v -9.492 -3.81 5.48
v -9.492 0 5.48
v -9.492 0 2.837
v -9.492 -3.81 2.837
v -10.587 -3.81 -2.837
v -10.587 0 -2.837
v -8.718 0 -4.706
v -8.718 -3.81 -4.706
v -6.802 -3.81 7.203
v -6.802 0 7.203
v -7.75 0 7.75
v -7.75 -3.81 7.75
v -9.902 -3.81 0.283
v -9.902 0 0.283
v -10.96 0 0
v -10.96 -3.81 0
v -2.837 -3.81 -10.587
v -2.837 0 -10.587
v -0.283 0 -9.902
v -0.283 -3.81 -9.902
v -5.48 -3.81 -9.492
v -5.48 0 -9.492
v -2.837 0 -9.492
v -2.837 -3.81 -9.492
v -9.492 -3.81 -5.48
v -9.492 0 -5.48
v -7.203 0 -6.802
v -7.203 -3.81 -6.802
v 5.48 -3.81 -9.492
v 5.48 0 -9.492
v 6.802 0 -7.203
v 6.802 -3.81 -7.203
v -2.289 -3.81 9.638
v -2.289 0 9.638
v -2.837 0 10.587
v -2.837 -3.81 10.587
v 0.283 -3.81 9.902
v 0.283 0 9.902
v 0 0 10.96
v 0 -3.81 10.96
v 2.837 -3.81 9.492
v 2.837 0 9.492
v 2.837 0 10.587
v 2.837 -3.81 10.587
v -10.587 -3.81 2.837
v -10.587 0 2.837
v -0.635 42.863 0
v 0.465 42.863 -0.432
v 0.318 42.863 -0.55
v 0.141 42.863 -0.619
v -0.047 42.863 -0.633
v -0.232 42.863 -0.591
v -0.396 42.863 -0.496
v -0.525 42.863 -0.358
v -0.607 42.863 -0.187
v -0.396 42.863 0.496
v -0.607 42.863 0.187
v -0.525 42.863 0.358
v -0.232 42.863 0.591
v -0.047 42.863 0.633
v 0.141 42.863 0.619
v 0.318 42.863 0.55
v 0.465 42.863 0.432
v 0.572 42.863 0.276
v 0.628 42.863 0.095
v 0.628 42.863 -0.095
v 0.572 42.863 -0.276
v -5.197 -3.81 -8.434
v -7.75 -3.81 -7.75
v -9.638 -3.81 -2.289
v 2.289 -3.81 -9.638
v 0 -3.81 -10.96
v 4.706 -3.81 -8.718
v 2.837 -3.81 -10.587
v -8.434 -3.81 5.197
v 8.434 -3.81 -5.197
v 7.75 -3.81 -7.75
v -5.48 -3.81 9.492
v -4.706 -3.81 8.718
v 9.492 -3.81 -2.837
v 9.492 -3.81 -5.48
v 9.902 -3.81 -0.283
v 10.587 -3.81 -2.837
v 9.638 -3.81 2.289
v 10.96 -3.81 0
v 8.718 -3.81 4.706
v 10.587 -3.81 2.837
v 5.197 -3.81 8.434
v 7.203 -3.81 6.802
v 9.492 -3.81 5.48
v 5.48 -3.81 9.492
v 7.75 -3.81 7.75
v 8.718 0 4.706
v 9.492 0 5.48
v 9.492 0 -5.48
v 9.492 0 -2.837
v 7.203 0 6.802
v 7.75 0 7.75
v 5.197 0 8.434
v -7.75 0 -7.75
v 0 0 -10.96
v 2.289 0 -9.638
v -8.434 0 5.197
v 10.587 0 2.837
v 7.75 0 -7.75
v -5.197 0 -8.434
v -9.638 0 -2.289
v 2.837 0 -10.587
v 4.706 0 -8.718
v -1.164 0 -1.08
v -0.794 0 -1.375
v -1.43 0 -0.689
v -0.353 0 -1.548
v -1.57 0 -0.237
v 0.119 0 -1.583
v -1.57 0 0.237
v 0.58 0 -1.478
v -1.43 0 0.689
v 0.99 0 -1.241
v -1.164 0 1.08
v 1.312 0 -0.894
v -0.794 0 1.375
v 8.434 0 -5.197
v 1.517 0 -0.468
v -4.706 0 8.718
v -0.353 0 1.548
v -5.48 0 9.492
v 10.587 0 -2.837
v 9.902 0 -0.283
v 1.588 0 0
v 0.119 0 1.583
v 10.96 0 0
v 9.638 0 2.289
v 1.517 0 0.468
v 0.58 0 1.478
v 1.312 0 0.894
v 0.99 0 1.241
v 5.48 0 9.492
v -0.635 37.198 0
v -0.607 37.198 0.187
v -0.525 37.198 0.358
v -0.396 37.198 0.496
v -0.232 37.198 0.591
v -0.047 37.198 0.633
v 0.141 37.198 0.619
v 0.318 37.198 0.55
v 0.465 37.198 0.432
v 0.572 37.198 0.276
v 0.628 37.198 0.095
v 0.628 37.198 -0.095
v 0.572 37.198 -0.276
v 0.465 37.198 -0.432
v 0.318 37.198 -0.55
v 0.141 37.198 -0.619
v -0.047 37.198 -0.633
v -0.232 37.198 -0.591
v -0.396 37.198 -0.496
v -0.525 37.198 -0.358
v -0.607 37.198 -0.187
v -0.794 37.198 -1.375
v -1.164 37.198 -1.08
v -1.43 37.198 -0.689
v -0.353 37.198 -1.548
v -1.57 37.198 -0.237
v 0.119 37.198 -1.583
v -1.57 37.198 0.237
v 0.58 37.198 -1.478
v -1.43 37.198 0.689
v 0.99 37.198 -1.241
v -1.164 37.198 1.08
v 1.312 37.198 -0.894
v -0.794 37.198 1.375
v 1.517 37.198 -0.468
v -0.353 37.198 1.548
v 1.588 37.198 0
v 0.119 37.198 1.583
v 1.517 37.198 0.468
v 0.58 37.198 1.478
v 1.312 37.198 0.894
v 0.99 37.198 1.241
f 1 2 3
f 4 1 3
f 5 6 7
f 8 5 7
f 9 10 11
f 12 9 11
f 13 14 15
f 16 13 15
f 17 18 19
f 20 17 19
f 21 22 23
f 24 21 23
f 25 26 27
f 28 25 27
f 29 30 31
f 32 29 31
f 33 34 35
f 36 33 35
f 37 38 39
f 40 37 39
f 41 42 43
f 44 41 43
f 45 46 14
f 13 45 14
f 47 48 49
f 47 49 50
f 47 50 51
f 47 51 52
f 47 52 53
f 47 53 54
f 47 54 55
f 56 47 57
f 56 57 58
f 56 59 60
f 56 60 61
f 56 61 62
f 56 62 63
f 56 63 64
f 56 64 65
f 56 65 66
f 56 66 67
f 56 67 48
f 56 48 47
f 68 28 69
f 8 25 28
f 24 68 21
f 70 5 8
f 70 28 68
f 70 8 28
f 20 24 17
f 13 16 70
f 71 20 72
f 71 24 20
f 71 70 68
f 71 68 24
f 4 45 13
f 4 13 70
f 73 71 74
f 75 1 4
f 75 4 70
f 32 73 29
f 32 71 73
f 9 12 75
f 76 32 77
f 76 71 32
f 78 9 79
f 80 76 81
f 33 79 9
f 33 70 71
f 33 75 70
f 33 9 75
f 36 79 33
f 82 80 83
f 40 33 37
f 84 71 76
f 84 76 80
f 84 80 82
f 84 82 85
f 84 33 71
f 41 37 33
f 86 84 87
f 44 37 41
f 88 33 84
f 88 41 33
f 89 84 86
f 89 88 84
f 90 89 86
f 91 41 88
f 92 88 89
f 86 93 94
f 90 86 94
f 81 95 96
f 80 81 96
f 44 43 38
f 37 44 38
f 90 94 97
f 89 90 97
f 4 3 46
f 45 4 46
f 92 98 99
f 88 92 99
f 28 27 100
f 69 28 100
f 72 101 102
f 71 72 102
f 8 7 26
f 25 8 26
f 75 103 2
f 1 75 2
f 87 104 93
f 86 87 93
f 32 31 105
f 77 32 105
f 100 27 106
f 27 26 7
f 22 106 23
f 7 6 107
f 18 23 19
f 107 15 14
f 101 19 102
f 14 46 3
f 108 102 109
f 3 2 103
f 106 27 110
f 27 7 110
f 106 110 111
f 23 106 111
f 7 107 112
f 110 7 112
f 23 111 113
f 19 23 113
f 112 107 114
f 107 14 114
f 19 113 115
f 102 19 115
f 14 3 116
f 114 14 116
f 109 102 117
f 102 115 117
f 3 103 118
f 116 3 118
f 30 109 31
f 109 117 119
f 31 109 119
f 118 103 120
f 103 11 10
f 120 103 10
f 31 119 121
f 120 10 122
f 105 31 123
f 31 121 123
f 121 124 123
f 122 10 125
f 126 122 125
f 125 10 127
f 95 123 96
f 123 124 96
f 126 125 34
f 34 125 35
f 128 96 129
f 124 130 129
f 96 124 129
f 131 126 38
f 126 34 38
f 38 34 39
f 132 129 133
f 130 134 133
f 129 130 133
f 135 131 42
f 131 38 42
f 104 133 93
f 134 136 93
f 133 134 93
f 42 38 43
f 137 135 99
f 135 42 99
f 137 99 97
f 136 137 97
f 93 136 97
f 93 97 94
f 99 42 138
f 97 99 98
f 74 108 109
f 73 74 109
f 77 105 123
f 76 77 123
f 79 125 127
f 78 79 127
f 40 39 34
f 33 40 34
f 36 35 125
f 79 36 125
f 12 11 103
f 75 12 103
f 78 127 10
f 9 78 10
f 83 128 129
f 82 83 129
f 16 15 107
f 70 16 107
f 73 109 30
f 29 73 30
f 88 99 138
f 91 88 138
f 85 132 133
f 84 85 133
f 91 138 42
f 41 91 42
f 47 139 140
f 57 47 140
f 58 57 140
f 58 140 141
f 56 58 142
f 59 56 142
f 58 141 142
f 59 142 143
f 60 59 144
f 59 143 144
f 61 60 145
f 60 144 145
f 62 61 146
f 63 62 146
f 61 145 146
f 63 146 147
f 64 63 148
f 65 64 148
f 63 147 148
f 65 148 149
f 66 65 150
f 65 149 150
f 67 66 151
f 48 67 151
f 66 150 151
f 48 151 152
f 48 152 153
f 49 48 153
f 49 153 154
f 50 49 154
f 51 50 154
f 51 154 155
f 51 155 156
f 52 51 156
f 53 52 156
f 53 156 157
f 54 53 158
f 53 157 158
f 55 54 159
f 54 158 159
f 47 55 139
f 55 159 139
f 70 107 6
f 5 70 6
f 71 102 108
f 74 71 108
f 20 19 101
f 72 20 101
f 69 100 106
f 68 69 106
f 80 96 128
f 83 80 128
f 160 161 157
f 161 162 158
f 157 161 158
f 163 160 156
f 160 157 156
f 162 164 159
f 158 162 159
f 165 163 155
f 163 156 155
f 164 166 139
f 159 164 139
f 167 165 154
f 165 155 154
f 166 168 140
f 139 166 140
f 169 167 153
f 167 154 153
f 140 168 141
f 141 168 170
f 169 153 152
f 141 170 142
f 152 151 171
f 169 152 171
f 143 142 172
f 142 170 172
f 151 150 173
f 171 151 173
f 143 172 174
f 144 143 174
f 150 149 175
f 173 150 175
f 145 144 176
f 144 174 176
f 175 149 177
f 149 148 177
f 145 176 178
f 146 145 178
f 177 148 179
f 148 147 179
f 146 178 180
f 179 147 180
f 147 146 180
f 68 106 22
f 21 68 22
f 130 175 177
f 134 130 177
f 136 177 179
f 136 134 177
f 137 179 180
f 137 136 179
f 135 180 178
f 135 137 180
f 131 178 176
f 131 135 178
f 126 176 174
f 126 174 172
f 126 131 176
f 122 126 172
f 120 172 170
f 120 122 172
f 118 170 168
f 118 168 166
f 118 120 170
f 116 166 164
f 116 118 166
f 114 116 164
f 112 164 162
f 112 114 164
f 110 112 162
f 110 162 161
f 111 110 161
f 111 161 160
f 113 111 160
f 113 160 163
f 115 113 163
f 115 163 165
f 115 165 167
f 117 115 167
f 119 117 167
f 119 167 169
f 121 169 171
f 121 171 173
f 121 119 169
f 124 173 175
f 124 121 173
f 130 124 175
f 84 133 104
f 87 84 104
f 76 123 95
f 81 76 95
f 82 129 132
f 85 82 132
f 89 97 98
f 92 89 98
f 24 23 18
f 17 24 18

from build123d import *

# Parameters (mm, degrees)
F1_DEPTH = 3.81
F2_R     = 1.5875
F3_DEPTH = 37.1983
F4_R     = 0.635
F5_DEPTH = 5.6642


with BuildPart() as f1:
    # F0 (on Front) → F1 (new body)
    with BuildSketch(Plane.XZ):
        Polygon((0.283386, 9.90249), (0, 10.9601), (-2.289223, 9.638416), (-2.836683, 10.586644), (-4.705826, 8.717501), (-5.48005, 9.491725), (-6.801734, 7.202502), (-7.749961, 7.749961), (-8.434115, 5.196664), (-9.491725, 5.48005), (-9.491725, 2.836683), (-10.586644, 2.836683), (-9.90249, 0.283386), (-10.9601, 0), (-9.638416, -2.289223), (-10.586644, -2.836683), (-8.717501, -4.705826), (-9.491725, -5.48005), (-7.202502, -6.801734), (-7.749961, -7.749961), (-5.196664, -8.434115), (-5.48005, -9.491725), (-2.836683, -9.491725), (-2.836683, -10.586644), (-0.283386, -9.90249), (0, -10.9601), (2.289223, -9.638416), (2.836683, -10.586644), (4.705826, -8.717501), (5.48005, -9.491725), (6.801734, -7.202502), (7.749961, -7.749961), (8.434115, -5.196664), (9.491725, -5.48005), (9.491725, -2.836683), (10.586644, -2.836683), (9.90249, -0.283386), (10.9601, 0), (9.638416, 2.289223), (10.586644, 2.836683), (8.717501, 4.705826), (9.491725, 5.48005), (7.202502, 6.801734), (7.749961, 7.749961), (5.196664, 8.434115), (5.48005, 9.491725), (2.836683, 9.491725), (2.836683, 10.586644), align=None)
    extrude(amount=F1_DEPTH)

    # F2 (on Front) → F3 (join)
    with BuildSketch(Plane.XZ):
        Circle(F2_R)
    extrude(amount=-F3_DEPTH)

    # F4 (on face) → F5 (join)
    with BuildSketch(Plane(origin=(0, 37.1983, 0), x_dir=(-1, 0, 0), z_dir=(0, 1, 0))):
        Circle(F4_R)
    extrude(amount=F5_DEPTH)


solid = f1.part
